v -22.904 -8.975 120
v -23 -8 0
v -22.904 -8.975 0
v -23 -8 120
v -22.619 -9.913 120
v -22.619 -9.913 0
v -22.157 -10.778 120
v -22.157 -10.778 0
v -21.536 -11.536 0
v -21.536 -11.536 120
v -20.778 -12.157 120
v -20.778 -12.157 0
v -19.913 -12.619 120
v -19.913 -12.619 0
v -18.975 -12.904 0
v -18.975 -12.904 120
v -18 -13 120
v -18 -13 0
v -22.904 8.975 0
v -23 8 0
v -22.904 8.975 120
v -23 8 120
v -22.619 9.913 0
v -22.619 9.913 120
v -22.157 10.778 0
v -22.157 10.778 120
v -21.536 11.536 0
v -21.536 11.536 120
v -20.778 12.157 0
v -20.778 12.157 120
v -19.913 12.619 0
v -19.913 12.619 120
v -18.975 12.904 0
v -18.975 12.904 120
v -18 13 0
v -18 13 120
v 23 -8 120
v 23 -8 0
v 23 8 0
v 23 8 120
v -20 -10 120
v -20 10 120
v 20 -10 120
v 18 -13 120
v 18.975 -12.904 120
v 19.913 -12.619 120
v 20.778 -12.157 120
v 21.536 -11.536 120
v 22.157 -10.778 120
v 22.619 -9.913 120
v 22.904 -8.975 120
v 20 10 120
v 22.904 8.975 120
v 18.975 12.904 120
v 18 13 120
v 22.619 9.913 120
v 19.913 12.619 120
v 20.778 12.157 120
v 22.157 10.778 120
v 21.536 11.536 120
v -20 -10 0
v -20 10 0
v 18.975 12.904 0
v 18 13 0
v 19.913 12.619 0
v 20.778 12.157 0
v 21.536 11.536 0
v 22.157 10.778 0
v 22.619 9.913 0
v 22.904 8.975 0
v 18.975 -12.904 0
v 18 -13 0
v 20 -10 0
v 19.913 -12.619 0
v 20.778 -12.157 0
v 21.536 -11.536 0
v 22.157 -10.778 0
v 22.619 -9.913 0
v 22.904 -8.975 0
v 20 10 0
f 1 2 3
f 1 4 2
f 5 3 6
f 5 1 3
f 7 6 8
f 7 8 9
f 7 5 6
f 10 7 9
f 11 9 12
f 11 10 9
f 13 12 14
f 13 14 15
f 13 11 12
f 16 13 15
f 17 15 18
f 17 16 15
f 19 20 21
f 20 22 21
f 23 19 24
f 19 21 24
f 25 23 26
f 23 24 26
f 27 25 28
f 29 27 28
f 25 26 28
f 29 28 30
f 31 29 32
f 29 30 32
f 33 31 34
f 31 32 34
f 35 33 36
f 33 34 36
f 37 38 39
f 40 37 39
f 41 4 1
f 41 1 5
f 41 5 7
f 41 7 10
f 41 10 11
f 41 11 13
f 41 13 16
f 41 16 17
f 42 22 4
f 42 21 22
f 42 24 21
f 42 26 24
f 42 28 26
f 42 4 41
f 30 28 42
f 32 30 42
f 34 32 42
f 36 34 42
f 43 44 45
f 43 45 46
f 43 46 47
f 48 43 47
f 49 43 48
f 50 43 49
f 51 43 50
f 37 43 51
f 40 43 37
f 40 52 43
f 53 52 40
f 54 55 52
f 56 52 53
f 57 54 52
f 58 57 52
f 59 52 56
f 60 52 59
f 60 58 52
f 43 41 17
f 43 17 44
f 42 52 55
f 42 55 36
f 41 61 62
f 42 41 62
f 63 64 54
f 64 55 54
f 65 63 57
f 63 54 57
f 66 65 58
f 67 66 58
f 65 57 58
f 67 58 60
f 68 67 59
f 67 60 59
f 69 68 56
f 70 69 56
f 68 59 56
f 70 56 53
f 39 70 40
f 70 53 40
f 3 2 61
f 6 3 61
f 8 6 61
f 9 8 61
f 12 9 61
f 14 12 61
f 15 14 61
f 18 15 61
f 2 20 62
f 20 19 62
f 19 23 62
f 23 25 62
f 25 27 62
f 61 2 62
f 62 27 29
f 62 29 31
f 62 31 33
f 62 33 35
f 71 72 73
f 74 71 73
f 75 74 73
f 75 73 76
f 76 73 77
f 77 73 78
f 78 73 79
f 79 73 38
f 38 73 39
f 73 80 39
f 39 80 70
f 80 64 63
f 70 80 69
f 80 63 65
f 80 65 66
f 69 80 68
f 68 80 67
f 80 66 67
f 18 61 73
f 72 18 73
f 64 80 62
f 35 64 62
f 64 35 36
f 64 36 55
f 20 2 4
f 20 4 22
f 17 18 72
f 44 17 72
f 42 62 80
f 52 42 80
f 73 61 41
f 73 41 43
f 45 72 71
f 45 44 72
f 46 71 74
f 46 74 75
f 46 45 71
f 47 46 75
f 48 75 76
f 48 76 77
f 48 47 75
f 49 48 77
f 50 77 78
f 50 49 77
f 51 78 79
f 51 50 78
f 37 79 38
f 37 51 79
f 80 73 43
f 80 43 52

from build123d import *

# Parameters (mm, degrees)
SKETCH1_W           = 46
SKETCH1_H           = 26
SKETCH1_W_2         = 40
SKETCH1_H_2         = 20
EXTRUDE_THIN1_DEPTH = 120
FILLET2_R           = 5


with BuildPart() as part:
    # Sketch1 → Extrude-Thin1 (new body)
    with BuildSketch(Plane.XY):
        Rectangle(SKETCH1_W, SKETCH1_H)
        Rectangle(SKETCH1_W_2, SKETCH1_H_2, mode=Mode.SUBTRACT)
    extrude(amount=EXTRUDE_THIN1_DEPTH)

    # Fillet2
    fillet2_edges = [part.edges().sort_by_distance(p)[0] for p in [
        (-23, 13, 60),
        (23, 13, 60),
        (23, -13, 60),
        (-23, -13, 60),
    ]]
    fillet(fillet2_edges, radius=FILLET2_R)


solid = part.part
